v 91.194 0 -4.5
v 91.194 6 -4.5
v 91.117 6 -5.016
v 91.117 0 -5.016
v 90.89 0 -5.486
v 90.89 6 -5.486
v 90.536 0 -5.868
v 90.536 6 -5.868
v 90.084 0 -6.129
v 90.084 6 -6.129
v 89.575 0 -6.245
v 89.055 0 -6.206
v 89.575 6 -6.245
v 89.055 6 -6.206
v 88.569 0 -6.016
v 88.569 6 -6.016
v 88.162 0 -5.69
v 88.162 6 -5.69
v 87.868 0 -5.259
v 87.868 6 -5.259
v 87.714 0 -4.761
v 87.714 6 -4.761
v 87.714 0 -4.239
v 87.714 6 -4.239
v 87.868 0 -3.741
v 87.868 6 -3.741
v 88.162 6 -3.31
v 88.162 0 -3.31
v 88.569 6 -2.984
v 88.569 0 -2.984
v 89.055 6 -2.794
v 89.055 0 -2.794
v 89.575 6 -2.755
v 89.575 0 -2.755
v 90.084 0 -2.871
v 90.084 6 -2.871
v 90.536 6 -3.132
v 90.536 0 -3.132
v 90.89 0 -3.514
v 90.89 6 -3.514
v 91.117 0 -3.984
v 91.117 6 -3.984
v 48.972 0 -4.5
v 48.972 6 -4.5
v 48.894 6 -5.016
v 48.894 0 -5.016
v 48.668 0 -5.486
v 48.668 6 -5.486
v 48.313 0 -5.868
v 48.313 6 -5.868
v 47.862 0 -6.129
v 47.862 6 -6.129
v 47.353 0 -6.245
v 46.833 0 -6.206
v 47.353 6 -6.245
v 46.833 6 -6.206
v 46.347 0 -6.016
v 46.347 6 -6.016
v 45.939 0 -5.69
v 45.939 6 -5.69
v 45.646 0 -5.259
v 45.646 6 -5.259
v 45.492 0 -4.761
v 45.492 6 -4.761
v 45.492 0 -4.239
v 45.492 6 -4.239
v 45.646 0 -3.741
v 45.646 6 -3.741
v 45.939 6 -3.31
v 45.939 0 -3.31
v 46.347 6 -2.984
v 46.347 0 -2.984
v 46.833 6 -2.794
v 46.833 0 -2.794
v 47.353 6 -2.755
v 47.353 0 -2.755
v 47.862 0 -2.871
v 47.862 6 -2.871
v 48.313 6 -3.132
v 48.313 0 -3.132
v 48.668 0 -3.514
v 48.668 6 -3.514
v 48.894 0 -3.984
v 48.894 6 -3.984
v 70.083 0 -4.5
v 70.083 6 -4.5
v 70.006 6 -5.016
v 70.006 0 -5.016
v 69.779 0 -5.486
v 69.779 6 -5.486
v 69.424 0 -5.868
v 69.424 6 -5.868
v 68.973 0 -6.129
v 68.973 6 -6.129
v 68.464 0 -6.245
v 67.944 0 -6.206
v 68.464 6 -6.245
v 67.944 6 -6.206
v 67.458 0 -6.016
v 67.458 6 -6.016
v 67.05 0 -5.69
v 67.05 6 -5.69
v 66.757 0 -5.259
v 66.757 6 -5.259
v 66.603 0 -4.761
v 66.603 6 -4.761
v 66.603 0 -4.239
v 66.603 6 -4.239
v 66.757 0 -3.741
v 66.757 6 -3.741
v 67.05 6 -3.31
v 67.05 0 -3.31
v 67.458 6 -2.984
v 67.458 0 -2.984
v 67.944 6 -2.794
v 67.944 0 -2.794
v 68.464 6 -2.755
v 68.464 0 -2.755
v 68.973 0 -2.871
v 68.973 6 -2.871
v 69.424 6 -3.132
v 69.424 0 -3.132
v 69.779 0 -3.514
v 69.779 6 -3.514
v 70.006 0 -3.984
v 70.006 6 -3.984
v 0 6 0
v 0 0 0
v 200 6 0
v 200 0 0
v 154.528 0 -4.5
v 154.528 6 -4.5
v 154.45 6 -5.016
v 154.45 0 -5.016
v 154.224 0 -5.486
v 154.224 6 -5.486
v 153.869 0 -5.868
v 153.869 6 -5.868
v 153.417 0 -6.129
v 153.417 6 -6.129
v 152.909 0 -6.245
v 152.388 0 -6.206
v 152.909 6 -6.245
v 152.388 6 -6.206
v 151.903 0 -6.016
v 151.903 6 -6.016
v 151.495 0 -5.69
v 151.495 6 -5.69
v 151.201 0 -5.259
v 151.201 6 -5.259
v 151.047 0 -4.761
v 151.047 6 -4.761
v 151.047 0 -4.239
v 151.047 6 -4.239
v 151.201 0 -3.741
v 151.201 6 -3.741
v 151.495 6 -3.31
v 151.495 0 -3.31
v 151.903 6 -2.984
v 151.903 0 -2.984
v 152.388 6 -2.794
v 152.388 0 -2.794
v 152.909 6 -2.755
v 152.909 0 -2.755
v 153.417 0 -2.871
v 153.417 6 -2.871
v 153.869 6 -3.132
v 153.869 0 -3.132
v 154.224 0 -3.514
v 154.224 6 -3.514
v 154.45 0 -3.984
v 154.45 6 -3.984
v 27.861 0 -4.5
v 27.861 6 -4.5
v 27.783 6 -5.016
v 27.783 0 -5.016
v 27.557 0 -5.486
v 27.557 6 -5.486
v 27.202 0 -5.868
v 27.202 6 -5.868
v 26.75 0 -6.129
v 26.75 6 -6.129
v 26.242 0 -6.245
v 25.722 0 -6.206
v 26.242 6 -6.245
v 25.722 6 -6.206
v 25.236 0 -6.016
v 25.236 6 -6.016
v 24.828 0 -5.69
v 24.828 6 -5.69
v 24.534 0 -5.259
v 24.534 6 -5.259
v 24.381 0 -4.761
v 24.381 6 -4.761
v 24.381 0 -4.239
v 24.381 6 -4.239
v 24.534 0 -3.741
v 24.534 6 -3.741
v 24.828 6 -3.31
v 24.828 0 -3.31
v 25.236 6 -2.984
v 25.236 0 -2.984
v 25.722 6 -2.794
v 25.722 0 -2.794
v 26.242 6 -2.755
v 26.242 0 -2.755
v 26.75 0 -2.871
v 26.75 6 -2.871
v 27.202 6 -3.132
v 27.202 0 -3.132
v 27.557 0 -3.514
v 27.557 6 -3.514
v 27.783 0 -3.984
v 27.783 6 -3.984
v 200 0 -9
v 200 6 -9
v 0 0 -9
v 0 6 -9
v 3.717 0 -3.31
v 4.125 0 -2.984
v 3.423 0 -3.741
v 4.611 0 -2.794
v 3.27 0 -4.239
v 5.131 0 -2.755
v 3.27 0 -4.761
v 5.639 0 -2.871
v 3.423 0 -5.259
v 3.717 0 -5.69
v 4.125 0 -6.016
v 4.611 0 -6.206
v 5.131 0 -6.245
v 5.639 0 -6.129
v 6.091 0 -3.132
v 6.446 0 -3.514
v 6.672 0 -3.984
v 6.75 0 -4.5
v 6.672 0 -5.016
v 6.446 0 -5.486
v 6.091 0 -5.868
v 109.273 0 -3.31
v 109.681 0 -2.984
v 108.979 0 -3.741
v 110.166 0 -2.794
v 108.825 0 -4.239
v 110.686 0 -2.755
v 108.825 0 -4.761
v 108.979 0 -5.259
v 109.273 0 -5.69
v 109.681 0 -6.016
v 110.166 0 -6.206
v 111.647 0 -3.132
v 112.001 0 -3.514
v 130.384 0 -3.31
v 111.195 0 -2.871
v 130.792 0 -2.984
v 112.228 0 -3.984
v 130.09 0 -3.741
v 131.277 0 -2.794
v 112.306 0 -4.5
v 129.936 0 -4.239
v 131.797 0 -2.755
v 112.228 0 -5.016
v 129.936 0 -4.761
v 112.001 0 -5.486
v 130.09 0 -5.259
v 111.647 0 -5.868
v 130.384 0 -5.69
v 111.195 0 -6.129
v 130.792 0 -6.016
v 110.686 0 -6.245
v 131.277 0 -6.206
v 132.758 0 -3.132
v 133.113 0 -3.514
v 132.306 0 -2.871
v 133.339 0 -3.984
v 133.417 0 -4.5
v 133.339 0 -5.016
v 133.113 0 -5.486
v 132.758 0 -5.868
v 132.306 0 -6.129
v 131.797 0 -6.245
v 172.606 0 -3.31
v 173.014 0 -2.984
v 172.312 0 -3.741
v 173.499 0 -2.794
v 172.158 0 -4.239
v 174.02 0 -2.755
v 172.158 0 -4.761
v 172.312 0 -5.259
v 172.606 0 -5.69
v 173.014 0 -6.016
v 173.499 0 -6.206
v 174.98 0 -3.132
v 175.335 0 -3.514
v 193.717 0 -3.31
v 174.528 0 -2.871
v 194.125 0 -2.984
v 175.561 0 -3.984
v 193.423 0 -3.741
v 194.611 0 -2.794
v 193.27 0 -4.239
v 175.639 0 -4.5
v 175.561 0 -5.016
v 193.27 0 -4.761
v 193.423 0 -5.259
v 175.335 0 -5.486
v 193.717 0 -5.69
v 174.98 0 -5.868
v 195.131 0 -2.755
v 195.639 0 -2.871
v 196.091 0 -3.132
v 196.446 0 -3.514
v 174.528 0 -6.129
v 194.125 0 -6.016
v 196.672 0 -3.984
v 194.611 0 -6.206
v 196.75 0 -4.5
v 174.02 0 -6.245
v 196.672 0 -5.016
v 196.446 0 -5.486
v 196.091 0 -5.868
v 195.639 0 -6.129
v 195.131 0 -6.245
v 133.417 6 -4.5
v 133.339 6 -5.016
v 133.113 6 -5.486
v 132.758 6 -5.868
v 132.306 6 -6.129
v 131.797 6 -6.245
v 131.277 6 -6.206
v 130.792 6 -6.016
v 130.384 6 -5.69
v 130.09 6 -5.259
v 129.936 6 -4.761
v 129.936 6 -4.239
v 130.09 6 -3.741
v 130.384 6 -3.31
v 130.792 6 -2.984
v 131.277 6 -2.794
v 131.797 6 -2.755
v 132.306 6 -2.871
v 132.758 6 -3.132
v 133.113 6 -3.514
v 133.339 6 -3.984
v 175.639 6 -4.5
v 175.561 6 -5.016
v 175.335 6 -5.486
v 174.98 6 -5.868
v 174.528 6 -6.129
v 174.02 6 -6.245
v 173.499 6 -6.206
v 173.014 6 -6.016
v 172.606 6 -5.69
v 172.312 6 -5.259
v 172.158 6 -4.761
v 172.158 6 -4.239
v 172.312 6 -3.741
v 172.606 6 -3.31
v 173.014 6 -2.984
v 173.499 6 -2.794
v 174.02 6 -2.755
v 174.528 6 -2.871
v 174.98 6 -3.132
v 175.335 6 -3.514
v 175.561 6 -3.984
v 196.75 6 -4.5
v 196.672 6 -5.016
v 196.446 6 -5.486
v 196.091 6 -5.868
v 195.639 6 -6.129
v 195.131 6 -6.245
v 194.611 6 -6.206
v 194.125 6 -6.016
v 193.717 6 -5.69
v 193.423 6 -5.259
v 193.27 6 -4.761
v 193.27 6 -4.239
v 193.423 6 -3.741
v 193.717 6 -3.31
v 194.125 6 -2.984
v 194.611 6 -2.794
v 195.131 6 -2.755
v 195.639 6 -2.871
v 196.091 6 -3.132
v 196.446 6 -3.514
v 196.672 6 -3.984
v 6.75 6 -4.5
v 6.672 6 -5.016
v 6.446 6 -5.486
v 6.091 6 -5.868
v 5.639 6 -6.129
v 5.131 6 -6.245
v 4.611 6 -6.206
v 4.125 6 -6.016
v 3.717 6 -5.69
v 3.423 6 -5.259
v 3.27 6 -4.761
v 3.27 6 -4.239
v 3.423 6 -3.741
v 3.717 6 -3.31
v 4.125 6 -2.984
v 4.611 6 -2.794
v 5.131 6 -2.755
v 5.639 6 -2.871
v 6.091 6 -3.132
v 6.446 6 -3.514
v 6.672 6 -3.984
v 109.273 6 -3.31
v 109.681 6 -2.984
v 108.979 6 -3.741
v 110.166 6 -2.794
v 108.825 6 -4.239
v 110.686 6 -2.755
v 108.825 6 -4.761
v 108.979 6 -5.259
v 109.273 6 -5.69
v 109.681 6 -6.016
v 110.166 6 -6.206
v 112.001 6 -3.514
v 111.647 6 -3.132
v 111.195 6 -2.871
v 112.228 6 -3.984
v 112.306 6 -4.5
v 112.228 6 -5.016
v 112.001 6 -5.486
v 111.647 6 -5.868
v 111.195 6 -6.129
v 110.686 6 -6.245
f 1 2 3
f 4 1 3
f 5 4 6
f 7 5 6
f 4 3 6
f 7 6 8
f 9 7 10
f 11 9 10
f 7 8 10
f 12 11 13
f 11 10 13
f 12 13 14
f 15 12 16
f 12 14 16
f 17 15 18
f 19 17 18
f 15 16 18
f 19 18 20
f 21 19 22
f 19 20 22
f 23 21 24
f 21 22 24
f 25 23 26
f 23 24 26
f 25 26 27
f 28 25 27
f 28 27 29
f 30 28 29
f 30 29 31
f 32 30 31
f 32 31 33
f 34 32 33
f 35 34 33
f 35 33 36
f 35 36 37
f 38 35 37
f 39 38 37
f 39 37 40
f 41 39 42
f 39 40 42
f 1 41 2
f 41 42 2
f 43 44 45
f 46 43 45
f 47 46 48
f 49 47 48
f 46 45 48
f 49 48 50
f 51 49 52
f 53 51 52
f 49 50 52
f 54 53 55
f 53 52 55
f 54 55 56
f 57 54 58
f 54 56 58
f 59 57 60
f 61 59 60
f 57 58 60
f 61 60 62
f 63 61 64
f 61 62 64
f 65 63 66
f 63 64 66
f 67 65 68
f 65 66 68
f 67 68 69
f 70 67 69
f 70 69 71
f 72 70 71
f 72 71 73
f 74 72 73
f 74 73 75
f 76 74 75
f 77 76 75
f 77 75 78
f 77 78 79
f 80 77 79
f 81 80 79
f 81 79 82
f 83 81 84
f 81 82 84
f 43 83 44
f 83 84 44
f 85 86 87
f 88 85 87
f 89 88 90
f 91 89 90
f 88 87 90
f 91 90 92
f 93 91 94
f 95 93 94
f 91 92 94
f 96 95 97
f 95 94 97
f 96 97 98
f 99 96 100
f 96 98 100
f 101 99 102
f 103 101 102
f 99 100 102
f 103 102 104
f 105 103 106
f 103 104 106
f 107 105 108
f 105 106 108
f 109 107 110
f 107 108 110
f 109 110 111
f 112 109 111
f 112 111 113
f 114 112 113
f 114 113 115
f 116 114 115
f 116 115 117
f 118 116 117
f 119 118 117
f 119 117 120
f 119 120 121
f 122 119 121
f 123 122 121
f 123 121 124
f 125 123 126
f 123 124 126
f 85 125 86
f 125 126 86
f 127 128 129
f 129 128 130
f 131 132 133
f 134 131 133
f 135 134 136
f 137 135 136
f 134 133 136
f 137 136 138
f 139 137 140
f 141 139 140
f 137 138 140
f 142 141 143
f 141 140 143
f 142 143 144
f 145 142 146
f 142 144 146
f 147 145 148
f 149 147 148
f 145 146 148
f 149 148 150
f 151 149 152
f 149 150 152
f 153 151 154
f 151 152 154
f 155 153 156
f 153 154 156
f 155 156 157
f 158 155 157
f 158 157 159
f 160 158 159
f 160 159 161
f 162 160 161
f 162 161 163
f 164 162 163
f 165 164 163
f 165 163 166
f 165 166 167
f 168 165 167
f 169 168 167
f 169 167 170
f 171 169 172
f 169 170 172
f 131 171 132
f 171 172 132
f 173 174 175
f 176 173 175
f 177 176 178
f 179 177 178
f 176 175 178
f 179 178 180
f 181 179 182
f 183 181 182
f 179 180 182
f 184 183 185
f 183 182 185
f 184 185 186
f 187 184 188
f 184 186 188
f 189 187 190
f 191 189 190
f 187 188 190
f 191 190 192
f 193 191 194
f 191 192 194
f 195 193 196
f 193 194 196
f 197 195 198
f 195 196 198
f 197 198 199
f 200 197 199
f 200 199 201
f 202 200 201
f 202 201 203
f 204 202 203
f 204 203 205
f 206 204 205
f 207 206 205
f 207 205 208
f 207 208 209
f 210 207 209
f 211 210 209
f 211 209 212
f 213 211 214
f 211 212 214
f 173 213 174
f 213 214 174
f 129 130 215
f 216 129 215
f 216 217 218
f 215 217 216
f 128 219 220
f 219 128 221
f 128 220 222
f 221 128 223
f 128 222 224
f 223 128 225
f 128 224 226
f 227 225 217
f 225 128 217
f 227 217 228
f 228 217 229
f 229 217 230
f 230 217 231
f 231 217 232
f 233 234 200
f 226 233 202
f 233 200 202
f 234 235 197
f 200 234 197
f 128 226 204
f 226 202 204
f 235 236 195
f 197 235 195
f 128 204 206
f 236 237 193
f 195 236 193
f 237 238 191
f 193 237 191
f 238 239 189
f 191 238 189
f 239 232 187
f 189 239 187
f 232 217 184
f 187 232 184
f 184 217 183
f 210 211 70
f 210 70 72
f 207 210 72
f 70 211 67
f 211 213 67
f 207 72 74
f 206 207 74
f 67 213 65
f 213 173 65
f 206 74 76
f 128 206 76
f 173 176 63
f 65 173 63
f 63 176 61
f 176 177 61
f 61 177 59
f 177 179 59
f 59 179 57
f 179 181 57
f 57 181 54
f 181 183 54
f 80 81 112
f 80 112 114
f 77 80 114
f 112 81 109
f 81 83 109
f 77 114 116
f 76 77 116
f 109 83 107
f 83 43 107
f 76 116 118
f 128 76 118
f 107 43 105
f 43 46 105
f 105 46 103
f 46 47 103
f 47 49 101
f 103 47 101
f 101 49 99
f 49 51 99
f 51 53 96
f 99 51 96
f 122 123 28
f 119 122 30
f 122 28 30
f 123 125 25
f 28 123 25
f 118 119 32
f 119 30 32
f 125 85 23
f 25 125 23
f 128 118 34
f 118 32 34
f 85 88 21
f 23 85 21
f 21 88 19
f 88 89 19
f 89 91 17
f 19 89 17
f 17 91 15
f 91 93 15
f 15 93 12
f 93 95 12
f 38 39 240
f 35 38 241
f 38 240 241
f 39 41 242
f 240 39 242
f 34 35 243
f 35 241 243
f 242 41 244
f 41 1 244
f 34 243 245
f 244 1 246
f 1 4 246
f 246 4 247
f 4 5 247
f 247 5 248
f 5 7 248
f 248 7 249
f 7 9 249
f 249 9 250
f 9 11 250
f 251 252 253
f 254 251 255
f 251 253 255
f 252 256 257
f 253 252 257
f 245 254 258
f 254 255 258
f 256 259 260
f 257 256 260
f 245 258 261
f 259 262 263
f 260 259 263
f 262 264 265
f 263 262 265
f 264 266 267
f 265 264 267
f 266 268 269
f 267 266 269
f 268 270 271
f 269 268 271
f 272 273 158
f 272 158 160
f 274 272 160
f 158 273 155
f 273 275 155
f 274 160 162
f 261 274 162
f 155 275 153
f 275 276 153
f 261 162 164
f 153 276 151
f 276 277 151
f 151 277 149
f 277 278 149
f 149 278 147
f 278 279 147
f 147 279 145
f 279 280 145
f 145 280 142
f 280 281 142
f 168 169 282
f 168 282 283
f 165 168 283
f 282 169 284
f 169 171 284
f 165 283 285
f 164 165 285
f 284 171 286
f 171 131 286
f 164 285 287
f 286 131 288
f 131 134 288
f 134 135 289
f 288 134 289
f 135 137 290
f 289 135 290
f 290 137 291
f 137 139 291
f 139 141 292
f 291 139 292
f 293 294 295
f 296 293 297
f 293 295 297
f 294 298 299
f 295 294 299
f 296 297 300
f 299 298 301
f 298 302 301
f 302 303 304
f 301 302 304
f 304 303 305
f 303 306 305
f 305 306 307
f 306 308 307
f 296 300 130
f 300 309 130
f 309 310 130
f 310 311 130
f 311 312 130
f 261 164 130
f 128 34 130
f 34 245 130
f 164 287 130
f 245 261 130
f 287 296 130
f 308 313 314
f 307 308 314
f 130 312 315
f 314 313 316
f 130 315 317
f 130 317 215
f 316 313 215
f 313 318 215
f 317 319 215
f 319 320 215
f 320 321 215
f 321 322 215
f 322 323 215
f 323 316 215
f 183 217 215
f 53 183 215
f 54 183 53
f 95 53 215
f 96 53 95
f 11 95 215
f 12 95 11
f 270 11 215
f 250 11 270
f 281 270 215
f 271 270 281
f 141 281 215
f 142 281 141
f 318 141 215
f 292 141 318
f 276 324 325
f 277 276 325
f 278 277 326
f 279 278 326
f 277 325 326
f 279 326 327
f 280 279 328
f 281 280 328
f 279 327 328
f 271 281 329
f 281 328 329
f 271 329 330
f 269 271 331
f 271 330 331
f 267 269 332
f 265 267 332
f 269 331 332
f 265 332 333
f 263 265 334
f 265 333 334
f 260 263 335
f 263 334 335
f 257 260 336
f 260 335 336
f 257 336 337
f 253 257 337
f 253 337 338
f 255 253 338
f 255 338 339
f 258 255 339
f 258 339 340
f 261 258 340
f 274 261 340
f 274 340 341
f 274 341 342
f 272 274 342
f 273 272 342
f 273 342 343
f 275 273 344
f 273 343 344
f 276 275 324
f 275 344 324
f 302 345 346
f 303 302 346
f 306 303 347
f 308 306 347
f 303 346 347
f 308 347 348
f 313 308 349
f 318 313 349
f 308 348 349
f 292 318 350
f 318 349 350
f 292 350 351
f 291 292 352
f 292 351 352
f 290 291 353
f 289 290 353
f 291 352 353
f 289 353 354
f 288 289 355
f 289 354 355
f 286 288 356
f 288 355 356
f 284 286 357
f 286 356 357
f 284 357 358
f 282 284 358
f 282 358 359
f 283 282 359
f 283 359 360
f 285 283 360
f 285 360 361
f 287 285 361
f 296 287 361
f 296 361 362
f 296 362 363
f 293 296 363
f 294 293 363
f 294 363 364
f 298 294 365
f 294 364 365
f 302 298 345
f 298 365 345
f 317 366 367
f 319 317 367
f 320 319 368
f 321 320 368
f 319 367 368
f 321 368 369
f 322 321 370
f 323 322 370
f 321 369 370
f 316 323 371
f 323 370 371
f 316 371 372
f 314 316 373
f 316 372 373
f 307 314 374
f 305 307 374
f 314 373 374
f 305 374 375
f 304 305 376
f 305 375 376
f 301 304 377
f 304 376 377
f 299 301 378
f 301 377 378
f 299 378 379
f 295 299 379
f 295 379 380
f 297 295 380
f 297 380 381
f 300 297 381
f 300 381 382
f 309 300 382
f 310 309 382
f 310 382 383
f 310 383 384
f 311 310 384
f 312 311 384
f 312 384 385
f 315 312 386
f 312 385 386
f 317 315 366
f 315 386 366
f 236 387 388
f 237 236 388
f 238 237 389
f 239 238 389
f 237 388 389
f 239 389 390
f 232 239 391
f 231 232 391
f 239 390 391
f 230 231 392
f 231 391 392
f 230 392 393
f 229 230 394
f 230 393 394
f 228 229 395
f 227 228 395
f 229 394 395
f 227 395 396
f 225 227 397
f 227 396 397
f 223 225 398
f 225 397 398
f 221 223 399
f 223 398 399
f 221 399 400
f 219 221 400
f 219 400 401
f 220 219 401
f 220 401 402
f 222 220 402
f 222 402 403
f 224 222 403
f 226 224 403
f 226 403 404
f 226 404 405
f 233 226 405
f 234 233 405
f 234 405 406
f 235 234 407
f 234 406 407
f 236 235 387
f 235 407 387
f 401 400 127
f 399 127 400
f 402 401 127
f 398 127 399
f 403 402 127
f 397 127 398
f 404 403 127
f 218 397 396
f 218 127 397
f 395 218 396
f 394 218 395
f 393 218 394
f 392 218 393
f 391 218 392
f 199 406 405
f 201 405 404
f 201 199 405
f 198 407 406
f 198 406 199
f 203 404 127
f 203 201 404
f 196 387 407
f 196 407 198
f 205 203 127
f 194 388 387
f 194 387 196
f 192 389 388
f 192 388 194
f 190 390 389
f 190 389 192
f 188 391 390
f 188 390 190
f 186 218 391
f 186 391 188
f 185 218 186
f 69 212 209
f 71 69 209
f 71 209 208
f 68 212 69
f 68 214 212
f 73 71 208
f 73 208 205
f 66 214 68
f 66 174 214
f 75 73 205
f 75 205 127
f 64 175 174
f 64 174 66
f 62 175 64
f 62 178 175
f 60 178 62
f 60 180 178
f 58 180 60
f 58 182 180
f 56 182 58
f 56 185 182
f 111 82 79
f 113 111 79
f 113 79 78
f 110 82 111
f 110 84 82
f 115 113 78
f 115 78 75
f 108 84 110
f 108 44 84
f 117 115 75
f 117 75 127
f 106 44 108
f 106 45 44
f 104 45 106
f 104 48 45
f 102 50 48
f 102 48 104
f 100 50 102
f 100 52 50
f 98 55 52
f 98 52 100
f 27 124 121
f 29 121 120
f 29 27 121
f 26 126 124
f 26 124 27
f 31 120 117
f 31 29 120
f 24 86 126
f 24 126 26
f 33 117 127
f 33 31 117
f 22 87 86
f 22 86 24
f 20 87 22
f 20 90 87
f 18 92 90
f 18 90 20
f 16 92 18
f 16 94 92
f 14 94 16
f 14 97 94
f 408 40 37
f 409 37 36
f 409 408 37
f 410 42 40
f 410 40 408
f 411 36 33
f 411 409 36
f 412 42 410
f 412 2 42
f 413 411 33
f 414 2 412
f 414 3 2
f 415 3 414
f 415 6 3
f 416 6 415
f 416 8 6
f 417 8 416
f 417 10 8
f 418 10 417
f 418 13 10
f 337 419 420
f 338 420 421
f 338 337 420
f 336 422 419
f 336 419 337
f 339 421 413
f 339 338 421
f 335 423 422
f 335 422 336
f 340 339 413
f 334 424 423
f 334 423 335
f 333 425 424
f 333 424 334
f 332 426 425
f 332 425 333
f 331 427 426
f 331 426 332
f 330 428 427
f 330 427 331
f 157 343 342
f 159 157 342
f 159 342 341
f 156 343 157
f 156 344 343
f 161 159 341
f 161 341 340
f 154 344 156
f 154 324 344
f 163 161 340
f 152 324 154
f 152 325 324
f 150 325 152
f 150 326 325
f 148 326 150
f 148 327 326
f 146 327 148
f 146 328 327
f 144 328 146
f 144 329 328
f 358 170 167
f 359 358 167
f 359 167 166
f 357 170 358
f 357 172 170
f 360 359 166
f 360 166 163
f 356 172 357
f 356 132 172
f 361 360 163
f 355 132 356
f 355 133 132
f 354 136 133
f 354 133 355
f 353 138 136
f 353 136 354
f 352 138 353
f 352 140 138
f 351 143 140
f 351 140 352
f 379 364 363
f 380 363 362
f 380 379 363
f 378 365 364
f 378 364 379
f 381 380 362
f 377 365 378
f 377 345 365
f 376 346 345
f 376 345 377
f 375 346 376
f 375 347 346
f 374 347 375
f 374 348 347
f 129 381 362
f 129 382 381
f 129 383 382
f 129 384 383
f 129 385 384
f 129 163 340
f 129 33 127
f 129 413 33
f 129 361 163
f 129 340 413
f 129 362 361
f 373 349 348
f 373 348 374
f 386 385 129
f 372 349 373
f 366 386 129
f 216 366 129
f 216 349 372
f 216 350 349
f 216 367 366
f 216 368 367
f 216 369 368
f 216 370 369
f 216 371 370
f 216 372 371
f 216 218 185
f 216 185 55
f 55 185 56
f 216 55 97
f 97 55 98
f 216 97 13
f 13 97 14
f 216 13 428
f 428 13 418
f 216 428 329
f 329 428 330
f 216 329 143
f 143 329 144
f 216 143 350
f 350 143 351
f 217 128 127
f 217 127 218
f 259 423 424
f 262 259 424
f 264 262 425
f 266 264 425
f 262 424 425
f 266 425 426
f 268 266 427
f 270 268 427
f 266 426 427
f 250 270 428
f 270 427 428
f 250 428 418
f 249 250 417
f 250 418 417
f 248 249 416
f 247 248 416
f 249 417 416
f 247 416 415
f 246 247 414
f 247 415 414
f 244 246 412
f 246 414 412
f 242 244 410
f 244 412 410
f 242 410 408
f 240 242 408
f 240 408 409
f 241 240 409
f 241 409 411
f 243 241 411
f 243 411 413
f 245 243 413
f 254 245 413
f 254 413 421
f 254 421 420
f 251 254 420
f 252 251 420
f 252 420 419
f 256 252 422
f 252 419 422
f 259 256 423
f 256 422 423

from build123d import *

# Parameters (mm, degrees)
SKETCH1_W           = 200
SKETCH1_H           = 9
BOSS_EXTRUDE1_DEPTH = 6
SKETCH2_R           = 1.75
CUT_EXTRUDE1_DEPTH  = 6
LPATTERN1_COUNT     = 10
LPATTERN1_PITCH     = 21.111111111


with BuildPart() as part:
    # Sketch1 → Boss-Extrude1 (new body)
    with BuildSketch(Plane(origin=(0, 0, 0), x_dir=(1, 0, 0), z_dir=(0, 1, 0))):
        with Locations((100, 4.5)):
            Rectangle(SKETCH1_W, SKETCH1_H)
    extrude(amount=BOSS_EXTRUDE1_DEPTH)

    # Sketch2 → Cut-Extrude1 (cut)
    with BuildSketch(Plane(origin=(0, 6, 0), x_dir=(1, 0, 0), z_dir=(0, 1, 0))):
        with Locations((5, 4.5)):
            Circle(SKETCH2_R)
    cut_extrude1 = extrude(amount=-CUT_EXTRUDE1_DEPTH, mode=Mode.SUBTRACT)

    # LPattern1: Cut-Extrude1 ×10
    with Locations(*[(i * LPATTERN1_PITCH, 0, 0) for i in range(1, LPATTERN1_COUNT)]):
        add(cut_extrude1, mode=Mode.SUBTRACT)


solid = part.part
